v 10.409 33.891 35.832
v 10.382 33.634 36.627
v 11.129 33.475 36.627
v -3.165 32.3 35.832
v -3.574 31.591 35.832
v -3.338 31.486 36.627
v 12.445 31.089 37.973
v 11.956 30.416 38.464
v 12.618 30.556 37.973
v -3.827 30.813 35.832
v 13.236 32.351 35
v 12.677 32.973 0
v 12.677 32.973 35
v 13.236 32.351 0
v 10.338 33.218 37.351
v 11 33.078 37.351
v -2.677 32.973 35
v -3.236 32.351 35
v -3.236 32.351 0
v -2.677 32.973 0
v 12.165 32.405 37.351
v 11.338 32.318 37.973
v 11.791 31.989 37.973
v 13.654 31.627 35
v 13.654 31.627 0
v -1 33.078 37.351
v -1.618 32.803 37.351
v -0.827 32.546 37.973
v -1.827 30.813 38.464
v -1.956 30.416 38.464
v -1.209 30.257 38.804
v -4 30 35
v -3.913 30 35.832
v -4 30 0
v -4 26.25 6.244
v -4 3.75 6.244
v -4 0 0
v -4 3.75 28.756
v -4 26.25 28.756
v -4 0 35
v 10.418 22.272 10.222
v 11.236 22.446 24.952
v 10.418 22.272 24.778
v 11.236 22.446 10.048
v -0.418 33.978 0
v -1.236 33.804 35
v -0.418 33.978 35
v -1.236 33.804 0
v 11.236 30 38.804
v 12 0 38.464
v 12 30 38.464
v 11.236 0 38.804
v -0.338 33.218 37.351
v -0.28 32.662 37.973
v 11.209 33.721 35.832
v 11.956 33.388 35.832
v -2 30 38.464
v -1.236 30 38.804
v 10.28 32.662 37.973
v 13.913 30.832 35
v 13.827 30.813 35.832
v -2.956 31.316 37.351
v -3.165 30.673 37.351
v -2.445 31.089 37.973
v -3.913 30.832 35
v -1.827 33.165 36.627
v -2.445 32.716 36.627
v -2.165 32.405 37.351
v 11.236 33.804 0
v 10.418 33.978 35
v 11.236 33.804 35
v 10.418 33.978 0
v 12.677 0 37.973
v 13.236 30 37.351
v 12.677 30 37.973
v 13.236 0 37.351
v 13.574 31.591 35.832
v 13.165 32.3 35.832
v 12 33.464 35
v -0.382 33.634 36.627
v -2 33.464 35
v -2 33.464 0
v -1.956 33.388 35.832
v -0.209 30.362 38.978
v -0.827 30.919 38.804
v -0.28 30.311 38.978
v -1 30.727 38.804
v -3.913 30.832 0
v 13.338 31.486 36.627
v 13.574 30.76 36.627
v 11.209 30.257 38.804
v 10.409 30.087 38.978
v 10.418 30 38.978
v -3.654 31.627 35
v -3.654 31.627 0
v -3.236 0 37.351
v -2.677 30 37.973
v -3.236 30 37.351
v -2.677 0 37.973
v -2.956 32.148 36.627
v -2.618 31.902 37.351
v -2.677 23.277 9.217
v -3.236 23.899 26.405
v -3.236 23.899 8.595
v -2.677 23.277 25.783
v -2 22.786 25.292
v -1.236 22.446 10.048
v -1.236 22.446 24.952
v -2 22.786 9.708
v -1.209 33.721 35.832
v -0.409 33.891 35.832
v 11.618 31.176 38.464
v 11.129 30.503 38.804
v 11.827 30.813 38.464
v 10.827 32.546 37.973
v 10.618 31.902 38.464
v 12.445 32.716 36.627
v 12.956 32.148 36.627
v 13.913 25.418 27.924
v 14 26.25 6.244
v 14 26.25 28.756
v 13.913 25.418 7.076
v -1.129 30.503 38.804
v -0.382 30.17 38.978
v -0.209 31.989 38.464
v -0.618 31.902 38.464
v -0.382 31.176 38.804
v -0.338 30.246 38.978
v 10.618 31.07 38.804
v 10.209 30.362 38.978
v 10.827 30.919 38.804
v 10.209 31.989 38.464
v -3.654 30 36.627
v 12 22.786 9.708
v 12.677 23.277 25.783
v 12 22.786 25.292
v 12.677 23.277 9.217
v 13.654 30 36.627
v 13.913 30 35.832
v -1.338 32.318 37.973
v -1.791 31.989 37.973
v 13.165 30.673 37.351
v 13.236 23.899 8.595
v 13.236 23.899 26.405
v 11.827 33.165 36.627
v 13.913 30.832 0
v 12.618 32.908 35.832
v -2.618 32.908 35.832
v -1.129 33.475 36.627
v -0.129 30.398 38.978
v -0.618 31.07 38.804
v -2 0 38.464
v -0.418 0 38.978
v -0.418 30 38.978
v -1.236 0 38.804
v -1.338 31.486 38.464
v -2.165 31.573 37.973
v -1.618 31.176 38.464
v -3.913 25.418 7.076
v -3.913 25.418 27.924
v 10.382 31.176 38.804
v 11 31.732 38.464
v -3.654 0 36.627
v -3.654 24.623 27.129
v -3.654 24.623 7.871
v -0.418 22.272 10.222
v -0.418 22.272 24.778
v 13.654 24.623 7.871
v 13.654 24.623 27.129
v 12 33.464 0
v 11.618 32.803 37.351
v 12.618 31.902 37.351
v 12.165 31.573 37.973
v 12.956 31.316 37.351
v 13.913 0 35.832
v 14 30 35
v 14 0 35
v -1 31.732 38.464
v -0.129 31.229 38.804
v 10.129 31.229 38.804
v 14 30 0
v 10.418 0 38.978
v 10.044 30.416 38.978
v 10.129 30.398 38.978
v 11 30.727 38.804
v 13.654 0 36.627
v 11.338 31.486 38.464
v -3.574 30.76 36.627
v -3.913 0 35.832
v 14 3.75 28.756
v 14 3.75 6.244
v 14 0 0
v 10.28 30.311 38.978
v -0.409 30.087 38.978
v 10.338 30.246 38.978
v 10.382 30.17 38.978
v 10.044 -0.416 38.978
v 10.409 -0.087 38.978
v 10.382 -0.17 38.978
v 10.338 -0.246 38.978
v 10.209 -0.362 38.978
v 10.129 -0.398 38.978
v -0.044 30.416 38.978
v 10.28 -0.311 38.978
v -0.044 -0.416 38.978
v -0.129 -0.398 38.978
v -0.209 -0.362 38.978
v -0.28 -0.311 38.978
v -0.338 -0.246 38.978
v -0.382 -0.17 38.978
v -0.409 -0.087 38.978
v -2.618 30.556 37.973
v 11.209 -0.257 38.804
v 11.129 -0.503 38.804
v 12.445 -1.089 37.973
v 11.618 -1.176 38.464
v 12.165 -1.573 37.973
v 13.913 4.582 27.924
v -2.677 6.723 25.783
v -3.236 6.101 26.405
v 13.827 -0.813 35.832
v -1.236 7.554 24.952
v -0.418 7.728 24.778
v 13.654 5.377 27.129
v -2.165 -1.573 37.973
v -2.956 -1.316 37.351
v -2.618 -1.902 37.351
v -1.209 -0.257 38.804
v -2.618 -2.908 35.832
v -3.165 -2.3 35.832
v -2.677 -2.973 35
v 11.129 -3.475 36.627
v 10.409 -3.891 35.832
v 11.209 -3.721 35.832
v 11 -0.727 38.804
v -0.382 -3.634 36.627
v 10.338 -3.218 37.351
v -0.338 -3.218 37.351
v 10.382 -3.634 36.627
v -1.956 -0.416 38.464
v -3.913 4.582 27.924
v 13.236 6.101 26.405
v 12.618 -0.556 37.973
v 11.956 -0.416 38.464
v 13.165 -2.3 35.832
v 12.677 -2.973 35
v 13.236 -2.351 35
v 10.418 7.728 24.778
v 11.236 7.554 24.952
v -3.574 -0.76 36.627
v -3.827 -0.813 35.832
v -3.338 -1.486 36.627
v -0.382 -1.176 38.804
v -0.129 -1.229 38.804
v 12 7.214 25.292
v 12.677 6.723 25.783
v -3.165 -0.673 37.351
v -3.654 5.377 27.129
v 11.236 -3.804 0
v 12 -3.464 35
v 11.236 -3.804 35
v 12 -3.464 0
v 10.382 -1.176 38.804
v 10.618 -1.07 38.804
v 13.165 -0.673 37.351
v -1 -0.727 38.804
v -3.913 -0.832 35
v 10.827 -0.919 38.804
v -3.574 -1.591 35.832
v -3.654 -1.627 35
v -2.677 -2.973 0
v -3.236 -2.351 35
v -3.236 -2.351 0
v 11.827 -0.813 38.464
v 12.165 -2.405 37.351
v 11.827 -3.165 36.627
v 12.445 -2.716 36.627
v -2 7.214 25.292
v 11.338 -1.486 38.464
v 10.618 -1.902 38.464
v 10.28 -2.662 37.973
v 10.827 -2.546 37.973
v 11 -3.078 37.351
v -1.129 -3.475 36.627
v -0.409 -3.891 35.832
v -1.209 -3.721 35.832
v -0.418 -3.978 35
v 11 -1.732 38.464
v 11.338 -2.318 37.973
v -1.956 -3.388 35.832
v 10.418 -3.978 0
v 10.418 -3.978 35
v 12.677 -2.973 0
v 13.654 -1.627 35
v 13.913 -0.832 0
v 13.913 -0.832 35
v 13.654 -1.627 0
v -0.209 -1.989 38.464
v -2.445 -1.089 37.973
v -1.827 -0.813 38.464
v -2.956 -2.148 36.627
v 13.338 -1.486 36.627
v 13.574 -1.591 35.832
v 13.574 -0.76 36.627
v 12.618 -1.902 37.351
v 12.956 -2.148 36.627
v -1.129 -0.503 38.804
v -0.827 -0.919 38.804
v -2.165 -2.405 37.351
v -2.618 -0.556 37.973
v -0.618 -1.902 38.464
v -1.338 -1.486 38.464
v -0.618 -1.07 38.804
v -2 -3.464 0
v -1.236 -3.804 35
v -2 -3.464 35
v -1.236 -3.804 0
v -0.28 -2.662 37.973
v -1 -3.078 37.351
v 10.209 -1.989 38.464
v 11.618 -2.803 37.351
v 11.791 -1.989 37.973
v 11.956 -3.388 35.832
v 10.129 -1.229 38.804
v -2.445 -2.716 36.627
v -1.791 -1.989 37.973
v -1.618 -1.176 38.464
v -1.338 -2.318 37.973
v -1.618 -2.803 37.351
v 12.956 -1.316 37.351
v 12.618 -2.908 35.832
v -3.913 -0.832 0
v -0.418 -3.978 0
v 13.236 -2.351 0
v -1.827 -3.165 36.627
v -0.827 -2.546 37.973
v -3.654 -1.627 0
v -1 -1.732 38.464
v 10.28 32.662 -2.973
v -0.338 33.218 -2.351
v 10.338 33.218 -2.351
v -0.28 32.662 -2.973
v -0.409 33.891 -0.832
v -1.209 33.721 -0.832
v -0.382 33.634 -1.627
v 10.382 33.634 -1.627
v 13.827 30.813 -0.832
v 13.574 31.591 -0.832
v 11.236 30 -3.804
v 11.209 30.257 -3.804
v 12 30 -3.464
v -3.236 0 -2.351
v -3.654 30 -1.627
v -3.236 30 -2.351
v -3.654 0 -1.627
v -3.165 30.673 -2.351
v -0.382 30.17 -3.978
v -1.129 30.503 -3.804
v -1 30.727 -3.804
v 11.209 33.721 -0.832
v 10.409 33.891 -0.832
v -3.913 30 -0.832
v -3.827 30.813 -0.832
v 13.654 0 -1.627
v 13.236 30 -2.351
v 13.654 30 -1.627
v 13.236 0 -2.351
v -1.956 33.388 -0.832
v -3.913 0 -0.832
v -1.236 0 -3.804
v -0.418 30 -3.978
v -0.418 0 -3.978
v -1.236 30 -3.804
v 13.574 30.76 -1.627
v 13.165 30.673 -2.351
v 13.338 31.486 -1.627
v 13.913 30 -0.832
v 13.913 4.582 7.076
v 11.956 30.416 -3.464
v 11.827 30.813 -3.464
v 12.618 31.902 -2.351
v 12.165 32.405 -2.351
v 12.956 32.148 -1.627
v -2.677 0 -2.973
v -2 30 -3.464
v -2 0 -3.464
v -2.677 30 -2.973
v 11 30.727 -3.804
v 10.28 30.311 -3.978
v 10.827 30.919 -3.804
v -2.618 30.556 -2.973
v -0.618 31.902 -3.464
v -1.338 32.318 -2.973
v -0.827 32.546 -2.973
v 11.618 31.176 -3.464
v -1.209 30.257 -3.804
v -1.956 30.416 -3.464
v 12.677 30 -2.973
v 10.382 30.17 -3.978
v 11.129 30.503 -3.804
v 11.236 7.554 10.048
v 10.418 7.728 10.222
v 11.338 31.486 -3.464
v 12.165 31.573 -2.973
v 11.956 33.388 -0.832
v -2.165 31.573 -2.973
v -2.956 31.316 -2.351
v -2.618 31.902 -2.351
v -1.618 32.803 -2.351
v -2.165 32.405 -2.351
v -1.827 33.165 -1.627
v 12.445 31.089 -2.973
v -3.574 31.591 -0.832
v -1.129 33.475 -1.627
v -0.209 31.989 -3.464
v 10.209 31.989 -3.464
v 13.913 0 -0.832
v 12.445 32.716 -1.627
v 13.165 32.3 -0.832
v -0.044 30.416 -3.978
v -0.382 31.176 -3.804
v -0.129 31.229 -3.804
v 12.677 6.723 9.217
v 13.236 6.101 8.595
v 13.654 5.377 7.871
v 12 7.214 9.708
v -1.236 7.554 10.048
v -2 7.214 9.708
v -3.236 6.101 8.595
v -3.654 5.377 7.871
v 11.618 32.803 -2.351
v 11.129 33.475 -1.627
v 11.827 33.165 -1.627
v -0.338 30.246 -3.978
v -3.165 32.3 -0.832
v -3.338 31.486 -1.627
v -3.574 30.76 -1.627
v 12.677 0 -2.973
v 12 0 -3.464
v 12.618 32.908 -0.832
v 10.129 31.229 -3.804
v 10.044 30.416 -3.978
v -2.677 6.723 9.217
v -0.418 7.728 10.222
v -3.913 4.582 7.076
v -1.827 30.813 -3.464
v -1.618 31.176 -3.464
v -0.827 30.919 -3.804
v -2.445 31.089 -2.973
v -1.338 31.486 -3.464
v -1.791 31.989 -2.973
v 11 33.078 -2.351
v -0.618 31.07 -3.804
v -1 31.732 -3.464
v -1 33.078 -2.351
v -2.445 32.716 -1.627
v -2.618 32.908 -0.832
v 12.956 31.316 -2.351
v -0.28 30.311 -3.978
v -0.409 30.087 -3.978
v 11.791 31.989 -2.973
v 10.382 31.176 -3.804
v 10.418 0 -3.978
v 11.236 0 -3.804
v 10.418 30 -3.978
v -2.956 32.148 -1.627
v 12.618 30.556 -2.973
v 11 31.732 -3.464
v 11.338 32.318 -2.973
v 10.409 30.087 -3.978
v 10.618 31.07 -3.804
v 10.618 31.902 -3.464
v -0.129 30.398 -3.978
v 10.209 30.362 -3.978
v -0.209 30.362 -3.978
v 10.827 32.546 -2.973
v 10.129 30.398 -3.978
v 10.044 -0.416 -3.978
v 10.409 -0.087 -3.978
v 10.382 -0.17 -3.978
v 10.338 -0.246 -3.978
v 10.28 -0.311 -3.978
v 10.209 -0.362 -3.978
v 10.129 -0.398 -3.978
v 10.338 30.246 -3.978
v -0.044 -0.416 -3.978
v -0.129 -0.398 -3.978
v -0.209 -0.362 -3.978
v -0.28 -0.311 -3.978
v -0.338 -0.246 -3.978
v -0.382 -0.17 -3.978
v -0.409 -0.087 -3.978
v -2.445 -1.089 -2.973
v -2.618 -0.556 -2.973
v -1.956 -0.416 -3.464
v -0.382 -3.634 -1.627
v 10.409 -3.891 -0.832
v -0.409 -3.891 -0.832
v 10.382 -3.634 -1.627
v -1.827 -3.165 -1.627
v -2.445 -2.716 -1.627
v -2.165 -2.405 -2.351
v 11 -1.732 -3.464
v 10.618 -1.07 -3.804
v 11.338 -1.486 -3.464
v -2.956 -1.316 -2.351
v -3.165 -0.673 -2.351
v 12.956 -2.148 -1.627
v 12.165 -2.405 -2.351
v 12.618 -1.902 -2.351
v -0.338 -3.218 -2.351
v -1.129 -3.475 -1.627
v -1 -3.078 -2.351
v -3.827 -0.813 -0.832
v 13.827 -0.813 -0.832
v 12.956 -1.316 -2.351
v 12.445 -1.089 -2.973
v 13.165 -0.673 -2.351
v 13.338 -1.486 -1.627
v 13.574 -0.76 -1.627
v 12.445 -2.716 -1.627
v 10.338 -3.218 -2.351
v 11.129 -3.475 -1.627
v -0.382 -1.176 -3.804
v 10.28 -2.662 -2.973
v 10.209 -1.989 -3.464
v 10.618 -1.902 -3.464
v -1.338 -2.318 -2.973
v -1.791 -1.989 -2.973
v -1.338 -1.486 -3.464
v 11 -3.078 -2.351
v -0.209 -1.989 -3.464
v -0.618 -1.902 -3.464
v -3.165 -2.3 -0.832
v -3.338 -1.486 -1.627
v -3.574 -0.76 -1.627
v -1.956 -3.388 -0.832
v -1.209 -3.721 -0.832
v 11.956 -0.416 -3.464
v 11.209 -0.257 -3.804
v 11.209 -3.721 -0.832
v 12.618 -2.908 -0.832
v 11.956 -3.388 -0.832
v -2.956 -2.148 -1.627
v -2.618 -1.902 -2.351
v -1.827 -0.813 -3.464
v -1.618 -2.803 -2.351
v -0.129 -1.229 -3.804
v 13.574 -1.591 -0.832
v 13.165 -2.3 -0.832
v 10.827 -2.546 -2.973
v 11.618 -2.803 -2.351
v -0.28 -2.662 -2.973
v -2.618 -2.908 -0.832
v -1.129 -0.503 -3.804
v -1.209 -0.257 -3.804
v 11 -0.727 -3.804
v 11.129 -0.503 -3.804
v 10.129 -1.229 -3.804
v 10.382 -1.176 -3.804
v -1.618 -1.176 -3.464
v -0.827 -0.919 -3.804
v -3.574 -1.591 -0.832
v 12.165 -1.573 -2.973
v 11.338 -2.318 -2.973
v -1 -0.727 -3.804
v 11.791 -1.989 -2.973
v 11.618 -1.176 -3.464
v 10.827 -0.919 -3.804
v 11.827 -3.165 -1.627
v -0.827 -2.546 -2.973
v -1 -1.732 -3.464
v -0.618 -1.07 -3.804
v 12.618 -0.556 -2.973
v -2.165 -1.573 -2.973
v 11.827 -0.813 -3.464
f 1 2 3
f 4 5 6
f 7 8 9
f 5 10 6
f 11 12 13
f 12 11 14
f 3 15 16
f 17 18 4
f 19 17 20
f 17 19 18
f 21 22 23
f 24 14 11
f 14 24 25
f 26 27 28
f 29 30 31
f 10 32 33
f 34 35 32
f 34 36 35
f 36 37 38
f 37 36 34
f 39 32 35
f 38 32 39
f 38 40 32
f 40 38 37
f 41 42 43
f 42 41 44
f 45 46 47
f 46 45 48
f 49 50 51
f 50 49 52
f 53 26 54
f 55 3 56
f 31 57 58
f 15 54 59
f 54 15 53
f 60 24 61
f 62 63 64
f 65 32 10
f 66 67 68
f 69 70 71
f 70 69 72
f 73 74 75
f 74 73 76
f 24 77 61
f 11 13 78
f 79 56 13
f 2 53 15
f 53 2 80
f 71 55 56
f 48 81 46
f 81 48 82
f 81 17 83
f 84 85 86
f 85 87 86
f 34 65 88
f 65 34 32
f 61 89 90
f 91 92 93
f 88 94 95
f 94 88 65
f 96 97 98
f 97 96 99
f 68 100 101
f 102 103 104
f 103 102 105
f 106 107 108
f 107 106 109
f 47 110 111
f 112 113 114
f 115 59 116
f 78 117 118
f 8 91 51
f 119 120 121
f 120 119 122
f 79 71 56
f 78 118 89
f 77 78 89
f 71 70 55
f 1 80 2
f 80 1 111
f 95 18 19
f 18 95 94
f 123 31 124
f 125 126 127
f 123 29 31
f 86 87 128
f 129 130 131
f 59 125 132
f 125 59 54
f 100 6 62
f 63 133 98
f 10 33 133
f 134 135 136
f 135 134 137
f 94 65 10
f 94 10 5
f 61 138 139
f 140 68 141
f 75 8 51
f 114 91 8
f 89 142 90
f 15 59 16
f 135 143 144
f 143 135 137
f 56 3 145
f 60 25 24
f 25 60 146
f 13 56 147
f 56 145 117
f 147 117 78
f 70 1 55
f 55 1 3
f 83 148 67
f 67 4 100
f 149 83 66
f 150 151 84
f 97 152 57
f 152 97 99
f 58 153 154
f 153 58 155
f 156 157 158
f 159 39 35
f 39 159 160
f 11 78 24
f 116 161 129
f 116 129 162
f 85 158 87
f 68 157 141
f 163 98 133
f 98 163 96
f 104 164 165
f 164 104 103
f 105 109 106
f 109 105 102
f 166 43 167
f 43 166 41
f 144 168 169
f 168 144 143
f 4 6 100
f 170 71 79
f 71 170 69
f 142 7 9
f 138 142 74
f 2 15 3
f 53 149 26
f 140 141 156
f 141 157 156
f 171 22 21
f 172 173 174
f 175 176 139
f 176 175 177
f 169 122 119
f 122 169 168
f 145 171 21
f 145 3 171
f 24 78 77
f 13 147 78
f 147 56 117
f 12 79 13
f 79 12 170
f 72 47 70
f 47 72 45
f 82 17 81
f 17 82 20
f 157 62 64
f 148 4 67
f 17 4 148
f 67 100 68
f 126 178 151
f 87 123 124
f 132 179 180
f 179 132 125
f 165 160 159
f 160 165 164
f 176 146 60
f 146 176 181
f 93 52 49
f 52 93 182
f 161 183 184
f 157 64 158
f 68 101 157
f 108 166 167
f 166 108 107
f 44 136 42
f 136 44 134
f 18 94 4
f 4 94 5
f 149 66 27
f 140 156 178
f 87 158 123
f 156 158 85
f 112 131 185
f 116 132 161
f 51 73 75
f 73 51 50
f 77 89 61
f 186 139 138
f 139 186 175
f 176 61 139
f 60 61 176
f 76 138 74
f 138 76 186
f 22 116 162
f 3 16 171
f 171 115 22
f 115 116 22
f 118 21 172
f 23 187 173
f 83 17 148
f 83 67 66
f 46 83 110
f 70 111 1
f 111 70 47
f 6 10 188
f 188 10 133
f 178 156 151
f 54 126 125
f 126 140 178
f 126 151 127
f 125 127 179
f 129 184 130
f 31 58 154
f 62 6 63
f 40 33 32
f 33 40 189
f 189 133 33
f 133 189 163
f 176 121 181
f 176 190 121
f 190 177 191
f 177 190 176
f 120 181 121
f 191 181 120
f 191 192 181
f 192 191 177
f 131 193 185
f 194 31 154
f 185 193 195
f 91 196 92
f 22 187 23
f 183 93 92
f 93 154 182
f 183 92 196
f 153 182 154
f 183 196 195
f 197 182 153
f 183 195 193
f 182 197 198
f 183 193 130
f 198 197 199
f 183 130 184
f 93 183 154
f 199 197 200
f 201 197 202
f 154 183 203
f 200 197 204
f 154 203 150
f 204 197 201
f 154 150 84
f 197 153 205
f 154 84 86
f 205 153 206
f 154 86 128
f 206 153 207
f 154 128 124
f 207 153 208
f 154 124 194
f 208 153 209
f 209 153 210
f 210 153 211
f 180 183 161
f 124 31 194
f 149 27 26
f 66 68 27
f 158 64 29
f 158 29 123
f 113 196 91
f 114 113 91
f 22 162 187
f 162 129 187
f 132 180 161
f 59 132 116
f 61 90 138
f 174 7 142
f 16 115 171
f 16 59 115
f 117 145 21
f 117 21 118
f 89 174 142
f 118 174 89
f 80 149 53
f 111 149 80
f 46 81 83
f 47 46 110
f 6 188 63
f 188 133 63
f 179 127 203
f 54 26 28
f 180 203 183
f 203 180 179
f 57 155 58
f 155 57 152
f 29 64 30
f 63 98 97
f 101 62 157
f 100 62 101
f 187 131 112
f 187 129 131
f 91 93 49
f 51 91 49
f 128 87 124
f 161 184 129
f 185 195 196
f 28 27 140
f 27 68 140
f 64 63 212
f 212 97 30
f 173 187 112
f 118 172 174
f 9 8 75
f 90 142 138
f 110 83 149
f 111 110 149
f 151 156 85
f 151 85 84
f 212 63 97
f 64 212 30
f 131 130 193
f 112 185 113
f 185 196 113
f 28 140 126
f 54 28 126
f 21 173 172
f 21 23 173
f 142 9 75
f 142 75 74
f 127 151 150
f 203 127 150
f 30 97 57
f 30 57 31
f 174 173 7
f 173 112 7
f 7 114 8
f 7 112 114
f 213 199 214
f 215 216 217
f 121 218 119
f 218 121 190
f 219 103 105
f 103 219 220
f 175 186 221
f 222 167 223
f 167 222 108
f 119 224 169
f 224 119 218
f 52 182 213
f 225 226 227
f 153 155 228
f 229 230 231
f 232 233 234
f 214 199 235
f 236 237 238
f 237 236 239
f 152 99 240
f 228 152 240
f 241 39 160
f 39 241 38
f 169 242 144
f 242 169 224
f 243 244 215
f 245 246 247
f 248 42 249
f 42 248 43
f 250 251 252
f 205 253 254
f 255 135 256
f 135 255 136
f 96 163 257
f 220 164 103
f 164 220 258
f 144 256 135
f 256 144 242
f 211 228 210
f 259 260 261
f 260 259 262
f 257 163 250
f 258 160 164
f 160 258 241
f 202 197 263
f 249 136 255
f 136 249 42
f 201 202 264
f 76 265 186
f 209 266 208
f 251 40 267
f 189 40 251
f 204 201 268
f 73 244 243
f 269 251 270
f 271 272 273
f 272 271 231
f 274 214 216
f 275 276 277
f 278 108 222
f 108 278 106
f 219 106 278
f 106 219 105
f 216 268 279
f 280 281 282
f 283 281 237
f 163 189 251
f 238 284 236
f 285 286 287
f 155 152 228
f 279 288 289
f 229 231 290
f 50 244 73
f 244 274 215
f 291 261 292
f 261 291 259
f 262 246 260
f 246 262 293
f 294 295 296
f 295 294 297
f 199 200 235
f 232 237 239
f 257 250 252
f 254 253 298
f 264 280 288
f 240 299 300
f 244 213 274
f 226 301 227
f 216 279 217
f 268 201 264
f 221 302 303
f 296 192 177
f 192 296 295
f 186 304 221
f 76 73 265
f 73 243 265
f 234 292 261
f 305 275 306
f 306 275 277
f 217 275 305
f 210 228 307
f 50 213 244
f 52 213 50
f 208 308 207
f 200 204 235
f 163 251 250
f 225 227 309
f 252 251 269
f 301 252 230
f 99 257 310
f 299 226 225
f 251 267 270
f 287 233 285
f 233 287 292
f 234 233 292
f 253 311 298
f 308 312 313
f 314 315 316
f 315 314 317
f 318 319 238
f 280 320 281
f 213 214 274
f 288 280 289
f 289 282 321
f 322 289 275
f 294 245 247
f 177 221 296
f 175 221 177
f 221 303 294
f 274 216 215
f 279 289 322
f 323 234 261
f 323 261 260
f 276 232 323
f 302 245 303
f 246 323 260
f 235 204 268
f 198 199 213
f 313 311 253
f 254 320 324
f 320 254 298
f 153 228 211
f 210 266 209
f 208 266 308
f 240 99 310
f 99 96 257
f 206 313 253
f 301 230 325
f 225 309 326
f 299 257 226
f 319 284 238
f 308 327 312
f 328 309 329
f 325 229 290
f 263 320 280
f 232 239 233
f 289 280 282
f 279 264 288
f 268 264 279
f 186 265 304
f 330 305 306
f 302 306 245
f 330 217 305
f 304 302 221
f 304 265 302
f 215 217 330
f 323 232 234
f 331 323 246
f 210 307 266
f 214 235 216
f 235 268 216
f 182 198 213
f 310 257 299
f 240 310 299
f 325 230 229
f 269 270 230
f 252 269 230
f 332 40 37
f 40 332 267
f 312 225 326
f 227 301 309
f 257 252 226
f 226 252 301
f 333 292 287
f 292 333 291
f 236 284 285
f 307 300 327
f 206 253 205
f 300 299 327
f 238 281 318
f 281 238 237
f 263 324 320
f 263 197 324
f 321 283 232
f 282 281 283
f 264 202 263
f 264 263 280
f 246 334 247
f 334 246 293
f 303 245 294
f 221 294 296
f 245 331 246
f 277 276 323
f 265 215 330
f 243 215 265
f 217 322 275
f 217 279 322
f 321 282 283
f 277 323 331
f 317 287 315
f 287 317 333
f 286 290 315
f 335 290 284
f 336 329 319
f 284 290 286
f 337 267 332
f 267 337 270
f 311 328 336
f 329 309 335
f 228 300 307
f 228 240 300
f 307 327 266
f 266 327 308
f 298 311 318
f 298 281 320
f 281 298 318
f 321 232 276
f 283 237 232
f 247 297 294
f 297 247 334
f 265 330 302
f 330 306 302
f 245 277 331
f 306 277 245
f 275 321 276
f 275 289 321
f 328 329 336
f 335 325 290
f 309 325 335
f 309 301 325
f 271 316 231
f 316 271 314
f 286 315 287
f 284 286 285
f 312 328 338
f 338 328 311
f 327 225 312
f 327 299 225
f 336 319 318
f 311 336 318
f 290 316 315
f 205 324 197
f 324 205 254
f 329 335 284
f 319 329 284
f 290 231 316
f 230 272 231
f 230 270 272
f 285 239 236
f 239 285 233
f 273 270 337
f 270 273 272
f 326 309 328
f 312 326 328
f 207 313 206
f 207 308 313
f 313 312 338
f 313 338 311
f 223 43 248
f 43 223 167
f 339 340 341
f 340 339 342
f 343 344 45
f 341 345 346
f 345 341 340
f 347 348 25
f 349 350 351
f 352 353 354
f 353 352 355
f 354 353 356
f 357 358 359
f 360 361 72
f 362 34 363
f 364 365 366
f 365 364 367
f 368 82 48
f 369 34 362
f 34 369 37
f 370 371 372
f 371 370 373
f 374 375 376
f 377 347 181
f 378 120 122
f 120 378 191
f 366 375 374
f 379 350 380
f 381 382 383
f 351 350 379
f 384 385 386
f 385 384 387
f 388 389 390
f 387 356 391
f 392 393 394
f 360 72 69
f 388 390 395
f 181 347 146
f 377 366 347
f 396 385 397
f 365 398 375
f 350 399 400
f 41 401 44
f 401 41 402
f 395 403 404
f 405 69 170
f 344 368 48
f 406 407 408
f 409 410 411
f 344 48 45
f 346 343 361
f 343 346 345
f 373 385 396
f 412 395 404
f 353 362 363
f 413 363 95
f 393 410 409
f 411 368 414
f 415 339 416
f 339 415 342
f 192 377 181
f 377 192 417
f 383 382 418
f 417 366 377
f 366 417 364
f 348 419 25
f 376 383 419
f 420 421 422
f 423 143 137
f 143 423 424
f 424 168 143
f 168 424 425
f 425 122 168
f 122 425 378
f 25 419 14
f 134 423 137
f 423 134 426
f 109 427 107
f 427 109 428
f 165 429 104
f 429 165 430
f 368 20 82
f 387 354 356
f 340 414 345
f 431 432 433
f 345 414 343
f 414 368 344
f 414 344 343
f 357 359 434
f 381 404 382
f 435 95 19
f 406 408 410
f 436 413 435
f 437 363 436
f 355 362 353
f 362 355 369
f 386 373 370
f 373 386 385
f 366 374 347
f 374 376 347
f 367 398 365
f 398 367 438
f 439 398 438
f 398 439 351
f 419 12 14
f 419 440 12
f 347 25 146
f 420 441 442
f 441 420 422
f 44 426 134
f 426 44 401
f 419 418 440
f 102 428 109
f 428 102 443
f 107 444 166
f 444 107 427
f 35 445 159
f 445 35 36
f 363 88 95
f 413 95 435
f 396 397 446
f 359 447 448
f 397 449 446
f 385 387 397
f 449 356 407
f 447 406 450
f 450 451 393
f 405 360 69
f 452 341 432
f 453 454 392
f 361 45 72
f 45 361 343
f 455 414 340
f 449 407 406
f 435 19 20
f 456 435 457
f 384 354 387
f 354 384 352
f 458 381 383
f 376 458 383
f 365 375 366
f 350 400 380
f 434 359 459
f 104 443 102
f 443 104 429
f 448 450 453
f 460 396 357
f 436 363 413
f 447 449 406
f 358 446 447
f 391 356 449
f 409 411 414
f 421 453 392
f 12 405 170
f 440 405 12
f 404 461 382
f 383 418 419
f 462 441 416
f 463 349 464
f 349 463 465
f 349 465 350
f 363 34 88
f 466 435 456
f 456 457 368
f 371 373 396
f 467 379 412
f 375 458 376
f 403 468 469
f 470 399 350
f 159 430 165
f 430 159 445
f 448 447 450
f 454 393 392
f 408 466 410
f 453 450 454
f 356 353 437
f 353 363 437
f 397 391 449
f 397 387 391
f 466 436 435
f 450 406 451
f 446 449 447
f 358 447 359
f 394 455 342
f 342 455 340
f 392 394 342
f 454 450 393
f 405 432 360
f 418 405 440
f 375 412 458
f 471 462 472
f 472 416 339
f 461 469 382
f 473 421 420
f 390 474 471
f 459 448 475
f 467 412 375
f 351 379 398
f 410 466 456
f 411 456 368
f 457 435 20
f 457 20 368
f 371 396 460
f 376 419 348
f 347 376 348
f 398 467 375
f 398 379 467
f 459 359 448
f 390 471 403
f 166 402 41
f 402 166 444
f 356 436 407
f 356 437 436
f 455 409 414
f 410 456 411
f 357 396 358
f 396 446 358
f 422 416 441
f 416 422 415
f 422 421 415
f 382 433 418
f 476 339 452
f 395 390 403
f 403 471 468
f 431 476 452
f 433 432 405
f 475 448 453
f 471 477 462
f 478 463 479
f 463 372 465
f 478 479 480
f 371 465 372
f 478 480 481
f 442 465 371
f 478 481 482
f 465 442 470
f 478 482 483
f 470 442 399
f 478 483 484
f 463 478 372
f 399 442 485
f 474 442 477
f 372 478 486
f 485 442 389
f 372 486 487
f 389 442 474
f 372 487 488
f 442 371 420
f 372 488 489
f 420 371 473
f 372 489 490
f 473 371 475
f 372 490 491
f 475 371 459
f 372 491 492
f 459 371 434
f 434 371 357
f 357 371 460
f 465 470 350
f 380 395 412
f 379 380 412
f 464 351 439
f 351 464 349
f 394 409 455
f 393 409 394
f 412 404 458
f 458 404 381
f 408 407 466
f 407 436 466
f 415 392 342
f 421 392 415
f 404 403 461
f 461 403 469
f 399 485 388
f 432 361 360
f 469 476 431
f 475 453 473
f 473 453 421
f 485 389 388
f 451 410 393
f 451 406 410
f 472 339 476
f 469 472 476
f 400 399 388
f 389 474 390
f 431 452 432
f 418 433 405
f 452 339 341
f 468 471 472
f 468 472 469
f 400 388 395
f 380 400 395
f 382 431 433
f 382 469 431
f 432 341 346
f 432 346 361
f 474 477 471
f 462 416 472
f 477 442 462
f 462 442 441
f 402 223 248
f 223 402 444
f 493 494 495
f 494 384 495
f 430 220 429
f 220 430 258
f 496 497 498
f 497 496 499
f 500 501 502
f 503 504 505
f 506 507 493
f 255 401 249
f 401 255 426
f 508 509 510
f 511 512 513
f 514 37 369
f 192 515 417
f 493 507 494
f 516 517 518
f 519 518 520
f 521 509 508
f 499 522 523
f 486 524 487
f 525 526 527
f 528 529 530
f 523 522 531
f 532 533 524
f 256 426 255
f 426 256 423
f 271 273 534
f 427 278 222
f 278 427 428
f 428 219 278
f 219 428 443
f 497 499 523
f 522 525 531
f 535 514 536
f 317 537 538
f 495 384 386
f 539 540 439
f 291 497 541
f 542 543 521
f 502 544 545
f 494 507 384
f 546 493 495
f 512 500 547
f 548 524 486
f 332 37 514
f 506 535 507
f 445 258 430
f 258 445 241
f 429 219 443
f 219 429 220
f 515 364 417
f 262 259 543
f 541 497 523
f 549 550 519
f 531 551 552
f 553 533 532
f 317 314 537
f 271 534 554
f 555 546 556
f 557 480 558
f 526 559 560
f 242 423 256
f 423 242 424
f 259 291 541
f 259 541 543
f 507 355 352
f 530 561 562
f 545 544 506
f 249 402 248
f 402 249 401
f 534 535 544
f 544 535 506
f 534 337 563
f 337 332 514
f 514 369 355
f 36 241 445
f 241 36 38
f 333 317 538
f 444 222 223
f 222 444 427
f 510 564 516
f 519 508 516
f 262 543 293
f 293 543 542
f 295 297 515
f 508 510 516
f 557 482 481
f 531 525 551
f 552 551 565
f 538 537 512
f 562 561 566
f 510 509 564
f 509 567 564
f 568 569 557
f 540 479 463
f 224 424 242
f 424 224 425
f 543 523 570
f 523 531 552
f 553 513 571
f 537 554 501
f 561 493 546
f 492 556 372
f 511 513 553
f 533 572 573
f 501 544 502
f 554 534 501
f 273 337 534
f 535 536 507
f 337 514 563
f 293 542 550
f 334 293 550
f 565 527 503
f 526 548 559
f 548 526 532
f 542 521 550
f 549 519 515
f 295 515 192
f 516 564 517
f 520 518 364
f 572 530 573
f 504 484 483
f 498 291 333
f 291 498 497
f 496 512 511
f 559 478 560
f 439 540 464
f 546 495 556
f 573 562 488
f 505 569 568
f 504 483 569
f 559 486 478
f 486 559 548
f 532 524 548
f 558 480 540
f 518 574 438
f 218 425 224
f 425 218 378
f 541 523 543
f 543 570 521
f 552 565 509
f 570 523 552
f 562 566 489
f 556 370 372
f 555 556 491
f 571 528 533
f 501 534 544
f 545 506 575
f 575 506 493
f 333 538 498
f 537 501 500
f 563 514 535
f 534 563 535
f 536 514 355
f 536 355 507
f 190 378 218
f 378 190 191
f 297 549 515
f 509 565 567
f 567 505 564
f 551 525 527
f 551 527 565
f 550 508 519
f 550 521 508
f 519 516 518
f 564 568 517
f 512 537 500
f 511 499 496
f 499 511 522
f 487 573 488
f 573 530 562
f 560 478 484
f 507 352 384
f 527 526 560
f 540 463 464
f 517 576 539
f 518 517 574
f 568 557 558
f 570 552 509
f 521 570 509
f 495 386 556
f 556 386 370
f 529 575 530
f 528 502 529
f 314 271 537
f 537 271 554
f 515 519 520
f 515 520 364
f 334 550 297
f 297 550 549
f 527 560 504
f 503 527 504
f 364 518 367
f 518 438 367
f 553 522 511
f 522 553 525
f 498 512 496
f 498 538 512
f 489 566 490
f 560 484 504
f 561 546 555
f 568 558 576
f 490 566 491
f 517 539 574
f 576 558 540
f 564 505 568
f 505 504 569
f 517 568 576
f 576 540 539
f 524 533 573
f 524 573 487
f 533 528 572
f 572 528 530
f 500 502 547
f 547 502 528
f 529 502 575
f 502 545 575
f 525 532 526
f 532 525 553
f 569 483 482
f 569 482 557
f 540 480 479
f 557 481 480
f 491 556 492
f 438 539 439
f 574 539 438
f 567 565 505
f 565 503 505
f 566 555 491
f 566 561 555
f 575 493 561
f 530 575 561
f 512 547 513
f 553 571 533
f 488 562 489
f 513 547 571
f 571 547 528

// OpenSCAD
// file: ../../../../../shapes/chain-loop/chain-loop.scad
module chainLoop(xLength = 19,
                 yLength = 12,
                 yPercentage = 0.75,
                 zLength = 10,
                 zPercentage = 0.65)
{
    difference()
    {
        color("green")
        cube([xLength, yLength, zLength]);
                        
        cutout(xLength, yLength, yPercentage, zLength, zPercentage);
    }
}

/**
 * This module takes the cubic lengths of the chain loop and calculates the 
 * cutout dimensions based on the percentages given.
 * 
 * The percentages are expected to be of type float with 1 being 100%.
 */
module cutout(xLength,
              yLength,
              yPercentage,
              zLength,
              zPercentage
        )
{
    zCutoutLength = zLength * zPercentage;
    zTranslate = (zLength/2.0) - (zCutoutLength / 2.0);
    
    yCutoutLength = yLength * yPercentage;

    yTranslate = (yLength / 2.0) - (yCutoutLength / 2.0);
    
    // this is the cutout on the X axis
    translate([-1, yTranslate, zTranslate])
    cube([xLength+3, yCutoutLength, zCutoutLength]);    
}
// file: ../../doughnuts.scad
use <../../../shapes/chain-loop/chain-loop.scad>

module rectangularDoughnut(cornerRadius=4,
                           cubeCentered=false,
                           sides=30, 
                           sidesOnly=false,
                           size=[20,20,2],
                           zLength = 35)
{
    $fn=sides;

    x = size[0] - cornerRadius/2;
    y = size[1] - cornerRadius/2;
    z = size[2];

    minkowski(size, cornerRadius)
    {
        chainLoop(xLength = 10,
                  yLength = 30,
                  zLength = zLength,
                  zPercentage=0.64319);
//        cube(size=[x,y,z], center=cubeCentered);

        if(sidesOnly)
        {
            cylinder(r=cornerRadius);
        }
        else
        {
            sphere(r=cornerRadius);	    	
        }
    };
}
// main file
use <../../doughnuts.scad>
        
rectangularDoughnut(zLength = 35);
